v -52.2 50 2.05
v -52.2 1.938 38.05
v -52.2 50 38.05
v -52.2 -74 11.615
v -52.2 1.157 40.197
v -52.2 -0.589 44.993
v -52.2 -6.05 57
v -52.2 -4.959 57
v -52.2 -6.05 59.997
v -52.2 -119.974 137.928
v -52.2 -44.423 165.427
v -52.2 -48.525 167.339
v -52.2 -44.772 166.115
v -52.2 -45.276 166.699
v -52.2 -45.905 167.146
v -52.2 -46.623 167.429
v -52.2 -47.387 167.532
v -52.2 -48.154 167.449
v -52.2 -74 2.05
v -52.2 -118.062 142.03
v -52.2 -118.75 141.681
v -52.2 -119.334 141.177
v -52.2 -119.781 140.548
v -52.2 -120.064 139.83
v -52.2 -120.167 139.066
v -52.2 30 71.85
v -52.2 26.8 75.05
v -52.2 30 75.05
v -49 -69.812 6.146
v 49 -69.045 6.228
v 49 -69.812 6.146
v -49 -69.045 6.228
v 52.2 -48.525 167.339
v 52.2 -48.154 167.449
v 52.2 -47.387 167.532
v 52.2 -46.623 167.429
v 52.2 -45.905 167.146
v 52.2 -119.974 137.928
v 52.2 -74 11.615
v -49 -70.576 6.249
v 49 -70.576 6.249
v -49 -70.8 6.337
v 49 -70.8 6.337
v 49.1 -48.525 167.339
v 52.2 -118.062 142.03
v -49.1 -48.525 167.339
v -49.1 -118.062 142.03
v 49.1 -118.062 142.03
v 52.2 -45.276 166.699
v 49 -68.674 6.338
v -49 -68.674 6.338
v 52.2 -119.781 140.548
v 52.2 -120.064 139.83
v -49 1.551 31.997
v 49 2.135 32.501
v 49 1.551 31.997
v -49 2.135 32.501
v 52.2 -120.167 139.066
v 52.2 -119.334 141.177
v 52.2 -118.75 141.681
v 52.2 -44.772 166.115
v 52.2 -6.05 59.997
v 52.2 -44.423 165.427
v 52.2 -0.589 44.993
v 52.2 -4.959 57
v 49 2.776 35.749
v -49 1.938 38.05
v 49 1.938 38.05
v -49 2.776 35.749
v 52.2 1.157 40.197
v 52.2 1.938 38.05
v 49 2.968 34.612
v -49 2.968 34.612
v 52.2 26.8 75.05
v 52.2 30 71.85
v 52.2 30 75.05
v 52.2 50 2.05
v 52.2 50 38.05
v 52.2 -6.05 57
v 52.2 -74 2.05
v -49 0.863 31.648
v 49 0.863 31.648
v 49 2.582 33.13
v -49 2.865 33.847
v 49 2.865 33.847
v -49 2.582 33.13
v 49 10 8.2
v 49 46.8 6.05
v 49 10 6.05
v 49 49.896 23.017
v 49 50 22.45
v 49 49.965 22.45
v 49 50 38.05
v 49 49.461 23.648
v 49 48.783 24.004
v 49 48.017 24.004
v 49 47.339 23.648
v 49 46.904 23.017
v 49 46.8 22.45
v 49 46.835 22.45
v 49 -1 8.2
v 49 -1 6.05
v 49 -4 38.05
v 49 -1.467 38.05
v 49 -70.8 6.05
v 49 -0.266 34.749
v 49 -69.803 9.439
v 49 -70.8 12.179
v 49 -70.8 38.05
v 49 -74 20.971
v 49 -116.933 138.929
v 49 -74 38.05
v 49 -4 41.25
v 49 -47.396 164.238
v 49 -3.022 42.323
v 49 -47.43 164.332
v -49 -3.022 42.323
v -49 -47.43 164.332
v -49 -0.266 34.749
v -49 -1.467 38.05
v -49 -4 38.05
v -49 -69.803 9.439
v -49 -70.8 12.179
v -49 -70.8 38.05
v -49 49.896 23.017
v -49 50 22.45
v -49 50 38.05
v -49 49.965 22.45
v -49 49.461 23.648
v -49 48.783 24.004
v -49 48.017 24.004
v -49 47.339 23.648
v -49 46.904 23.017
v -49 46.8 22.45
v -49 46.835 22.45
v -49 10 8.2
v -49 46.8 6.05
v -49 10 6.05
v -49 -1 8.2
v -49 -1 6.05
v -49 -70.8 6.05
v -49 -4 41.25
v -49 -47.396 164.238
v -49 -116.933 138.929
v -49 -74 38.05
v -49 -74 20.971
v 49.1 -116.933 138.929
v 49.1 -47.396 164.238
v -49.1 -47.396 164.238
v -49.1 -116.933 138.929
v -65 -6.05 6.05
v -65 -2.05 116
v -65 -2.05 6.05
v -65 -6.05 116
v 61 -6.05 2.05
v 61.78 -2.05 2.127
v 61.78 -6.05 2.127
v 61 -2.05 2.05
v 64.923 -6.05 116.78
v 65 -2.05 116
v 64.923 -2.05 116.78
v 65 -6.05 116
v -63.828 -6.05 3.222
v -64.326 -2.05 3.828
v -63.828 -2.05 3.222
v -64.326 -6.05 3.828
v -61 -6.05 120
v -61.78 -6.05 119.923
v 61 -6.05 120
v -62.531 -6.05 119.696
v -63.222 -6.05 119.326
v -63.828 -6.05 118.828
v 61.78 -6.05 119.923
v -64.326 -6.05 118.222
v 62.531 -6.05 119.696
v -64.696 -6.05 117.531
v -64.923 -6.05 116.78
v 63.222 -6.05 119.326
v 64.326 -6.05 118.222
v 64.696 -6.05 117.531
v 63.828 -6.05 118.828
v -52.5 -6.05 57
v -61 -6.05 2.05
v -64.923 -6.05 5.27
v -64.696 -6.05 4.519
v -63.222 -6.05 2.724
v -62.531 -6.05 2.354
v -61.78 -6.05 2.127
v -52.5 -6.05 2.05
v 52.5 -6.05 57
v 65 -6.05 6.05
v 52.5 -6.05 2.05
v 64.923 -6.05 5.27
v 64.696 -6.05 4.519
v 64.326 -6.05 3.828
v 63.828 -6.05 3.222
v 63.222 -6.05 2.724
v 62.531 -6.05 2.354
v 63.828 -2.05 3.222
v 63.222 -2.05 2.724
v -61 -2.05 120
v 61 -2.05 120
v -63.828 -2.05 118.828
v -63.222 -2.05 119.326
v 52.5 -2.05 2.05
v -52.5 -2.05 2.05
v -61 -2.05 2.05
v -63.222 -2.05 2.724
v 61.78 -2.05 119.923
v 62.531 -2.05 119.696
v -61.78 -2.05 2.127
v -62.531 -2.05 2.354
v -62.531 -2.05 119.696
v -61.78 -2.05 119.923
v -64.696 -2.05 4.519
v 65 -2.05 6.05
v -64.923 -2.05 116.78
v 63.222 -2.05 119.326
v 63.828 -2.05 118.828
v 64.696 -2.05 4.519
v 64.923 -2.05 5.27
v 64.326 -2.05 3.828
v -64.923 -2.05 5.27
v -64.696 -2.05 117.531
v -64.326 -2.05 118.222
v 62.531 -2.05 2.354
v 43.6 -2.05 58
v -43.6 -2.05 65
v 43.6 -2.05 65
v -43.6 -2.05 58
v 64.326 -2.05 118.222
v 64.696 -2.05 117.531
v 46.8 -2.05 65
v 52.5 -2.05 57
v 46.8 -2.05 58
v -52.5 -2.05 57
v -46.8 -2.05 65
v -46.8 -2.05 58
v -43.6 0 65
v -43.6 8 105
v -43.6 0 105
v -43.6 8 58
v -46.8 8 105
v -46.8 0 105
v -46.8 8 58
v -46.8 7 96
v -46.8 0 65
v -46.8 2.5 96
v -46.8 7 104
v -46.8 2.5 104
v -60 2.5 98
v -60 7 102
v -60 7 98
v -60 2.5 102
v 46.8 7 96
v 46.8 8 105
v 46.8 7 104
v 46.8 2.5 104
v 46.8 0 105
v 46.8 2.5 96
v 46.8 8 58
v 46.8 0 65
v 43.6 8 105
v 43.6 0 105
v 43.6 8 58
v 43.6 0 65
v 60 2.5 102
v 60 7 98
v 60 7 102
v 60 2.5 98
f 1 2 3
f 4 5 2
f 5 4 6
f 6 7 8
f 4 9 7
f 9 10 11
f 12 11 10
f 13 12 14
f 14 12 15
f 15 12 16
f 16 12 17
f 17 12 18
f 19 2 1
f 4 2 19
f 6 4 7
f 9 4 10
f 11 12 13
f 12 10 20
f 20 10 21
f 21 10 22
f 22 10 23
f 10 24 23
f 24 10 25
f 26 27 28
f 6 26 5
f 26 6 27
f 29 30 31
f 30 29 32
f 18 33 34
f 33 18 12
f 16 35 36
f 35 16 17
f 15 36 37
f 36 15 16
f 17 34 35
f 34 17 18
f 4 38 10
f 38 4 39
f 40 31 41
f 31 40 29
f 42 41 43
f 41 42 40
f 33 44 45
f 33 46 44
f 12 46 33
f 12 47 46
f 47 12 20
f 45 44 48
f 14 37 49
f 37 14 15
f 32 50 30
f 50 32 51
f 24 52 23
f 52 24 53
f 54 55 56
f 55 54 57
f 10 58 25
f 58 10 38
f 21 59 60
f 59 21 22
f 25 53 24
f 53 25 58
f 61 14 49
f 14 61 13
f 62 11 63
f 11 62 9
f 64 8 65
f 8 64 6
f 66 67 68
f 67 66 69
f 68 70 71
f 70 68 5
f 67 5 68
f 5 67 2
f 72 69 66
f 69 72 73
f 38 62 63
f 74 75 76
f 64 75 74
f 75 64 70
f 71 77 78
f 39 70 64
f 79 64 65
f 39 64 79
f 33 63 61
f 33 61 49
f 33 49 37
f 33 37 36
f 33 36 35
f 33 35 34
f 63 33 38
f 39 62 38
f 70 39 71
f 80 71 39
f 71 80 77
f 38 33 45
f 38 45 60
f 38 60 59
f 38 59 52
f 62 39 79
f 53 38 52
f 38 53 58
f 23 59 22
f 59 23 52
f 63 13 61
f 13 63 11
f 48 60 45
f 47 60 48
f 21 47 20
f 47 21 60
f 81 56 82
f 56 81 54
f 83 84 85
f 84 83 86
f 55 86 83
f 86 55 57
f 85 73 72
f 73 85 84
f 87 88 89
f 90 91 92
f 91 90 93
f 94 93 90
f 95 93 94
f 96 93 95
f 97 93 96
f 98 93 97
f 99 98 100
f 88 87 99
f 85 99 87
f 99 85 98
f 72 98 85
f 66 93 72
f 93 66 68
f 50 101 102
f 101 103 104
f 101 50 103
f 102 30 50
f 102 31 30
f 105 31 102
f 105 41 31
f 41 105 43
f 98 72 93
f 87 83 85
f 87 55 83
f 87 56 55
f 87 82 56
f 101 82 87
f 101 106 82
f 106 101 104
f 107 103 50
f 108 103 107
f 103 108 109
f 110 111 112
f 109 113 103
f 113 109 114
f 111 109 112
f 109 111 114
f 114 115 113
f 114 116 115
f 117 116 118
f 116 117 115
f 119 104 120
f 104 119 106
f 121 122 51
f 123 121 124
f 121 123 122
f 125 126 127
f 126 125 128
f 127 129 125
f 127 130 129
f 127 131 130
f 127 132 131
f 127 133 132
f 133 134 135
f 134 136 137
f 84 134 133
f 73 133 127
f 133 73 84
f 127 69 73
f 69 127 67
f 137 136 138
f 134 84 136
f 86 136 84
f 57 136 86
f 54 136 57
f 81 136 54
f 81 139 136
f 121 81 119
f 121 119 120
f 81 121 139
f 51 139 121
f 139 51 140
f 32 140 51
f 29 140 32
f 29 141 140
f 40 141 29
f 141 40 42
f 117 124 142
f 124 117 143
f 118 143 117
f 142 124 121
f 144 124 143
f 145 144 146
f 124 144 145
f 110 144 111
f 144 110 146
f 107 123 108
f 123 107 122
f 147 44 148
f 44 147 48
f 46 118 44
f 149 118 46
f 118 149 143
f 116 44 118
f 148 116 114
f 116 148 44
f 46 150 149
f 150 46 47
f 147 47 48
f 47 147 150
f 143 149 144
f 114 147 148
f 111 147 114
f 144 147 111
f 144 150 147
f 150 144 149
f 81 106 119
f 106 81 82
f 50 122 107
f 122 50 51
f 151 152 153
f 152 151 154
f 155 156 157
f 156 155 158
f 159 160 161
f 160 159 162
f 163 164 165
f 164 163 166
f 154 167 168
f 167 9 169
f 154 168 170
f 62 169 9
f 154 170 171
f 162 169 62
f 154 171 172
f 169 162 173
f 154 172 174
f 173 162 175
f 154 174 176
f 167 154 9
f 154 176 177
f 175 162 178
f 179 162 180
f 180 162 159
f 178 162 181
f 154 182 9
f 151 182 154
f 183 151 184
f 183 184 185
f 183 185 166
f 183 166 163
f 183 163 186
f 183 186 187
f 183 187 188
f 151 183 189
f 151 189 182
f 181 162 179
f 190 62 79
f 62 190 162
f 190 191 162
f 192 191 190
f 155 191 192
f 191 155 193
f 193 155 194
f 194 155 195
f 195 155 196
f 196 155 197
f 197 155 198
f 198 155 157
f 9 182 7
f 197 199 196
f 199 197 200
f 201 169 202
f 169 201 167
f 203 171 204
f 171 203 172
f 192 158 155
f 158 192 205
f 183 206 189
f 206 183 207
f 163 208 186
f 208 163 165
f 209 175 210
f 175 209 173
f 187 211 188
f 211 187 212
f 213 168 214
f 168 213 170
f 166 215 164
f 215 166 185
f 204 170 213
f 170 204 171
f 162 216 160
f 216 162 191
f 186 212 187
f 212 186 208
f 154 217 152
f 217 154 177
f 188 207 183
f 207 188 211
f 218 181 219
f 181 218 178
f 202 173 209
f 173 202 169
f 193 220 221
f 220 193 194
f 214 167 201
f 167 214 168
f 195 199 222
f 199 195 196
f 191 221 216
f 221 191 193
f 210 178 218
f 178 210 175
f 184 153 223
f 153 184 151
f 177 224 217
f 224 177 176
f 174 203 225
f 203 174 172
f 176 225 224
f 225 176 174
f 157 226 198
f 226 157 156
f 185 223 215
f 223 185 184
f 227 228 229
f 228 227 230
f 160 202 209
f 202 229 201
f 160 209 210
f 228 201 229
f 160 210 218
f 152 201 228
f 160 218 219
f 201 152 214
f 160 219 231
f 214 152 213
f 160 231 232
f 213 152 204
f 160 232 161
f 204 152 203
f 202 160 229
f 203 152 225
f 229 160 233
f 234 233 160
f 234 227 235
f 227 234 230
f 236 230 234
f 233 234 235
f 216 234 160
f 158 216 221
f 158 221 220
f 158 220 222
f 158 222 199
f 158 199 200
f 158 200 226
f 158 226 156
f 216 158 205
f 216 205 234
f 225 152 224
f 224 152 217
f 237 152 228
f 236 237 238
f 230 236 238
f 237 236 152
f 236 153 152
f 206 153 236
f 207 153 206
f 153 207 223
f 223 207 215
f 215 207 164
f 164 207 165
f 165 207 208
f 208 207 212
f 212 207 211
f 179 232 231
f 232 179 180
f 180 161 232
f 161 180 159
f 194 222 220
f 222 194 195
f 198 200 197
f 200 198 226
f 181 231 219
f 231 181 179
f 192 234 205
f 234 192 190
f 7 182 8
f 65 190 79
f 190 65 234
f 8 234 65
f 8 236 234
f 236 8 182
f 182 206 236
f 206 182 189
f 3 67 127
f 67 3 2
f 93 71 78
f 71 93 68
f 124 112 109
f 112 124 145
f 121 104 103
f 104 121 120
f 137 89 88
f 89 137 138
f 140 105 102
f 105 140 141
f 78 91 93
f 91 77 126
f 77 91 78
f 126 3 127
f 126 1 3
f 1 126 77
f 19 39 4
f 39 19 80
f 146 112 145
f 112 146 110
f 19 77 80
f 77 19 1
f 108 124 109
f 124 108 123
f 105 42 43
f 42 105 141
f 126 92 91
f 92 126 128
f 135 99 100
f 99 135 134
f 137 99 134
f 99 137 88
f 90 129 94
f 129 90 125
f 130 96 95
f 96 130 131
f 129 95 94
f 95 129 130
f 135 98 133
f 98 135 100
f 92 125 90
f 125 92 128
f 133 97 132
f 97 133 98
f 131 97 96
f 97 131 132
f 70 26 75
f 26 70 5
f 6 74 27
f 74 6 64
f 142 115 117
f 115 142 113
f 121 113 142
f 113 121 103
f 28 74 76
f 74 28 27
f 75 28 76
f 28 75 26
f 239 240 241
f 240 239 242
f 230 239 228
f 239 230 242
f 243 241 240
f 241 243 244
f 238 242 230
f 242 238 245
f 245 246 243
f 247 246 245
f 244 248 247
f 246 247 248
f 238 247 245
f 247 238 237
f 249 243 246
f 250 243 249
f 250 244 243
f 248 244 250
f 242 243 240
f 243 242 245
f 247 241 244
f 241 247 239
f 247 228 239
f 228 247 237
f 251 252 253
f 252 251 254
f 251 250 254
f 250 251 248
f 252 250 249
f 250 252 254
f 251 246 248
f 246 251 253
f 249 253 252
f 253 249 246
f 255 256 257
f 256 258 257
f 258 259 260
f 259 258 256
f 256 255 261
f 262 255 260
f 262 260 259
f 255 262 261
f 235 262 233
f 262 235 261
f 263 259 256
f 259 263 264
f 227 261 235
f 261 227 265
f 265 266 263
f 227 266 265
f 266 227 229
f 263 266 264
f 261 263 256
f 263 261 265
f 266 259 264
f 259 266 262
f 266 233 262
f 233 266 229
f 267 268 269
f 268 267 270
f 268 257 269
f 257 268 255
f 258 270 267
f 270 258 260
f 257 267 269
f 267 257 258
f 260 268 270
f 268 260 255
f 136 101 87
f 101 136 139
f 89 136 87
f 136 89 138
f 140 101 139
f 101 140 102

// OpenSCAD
part = "candidate_b";

$fa = 5;
$fs = 0.8;

door_width = 110;
door_height = 110;
bar_spacing = 12;
bar_diameter = 3.5;
wall = 3.2;
door_tolerance = 3;
tray_base = bar_diameter/2 + 0.3;

inner_width = door_width - 12;
passage_depth = 74;
passage_length = 138;
passage_angle = 70;
plate_width = door_width + 20;
plate_bottom = tray_base;
plate_top = door_height + 10;
plate_thickness = max(wall,4);
tray_back = -74;
tray_front = 50;
tray_floor = 4;
tray_wall_height = 32;
tray_lip_height = 18;
hood_front = 30;
hood_height = 53;
snap_reach = door_tolerance + 2;
snap_beam = wall;

axis_y = -cos(passage_angle);
axis_z = sin(passage_angle);
normal_y = sin(passage_angle);
normal_z = cos(passage_angle);
lower_y = -35;
lower_z = 22;

function p(d,l) = [lower_y + normal_y*d + axis_y*l, lower_z + normal_z*d + axis_z*l];

passage = [p(-passage_depth/2,0),p(passage_depth/2,0),p(passage_depth/2,passage_length),p(-passage_depth/2,passage_length)];

function side_x(s) = s > 0 ? inner_width/2 : -inner_width/2-wall;

module yz_extrude(width) {
    translate([-width/2,0,0]) rotate([90,0,90]) linear_extrude(width) children();
}

module rounded_xz(width,height,r) {
    offset(r=r) square([width-2*r,height-2*r],center=true);
}

module magazine_shell() {
    difference() {
        yz_extrude(inner_width+2*wall) offset(r=wall) polygon(passage);
        yz_extrude(inner_width) polygon(passage);
        yz_extrude(inner_width+0.2) polygon([
            p(-passage_depth/2,passage_length-0.1),
            p(passage_depth/2,passage_length-0.1),
            p(passage_depth/2,passage_length+20),
            p(-passage_depth/2,passage_length+20)
        ]);
        yz_extrude(inner_width+0.2) polygon([
            p(-passage_depth/2,-20),
            p(passage_depth/2,-20),
            p(passage_depth/2,0.1),
            p(-passage_depth/2,0.1)
        ]);
    }
}

module faceplate() {
    difference() {
        translate([0,-bar_diameter/2-0.3-plate_thickness/2,(plate_bottom+plate_top)/2])
            rotate([90,0,0]) linear_extrude(plate_thickness,center=true)
                rounded_xz(plate_width,plate_top-plate_bottom,4);
        translate([0,-bar_diameter/2-0.3-plate_thickness/2,28]) cube([inner_width+7,plate_thickness+2,58],center=true);
    }
}

module tray() {
    translate([-inner_width/2-wall,tray_back,0]) cube([inner_width+2*wall,tray_front-tray_back,tray_floor]);
    for (s=[-1,1]) translate([side_x(s),tray_back,tray_floor])
        cube([wall,tray_front-tray_back,tray_wall_height]);
    translate([-inner_width/2-wall,tray_back,tray_floor]) cube([inner_width+2*wall,wall,tray_wall_height]);
    translate([-inner_width/2-wall,tray_front-wall,tray_floor])
        cube([inner_width+2*wall,wall,tray_lip_height-wall/2]);
    translate([-inner_width/2-wall,tray_front-wall/2,tray_floor+tray_lip_height-wall/2])
        rotate([0,90,0]) cylinder(d=wall,h=inner_width+2*wall);
    for (s=[-1,1]) translate([s*(inner_width/2+wall/2),tray_front-12,tray_floor+tray_lip_height])
        rotate([90,0,0]) cylinder(d=wall,h=tray_front-tray_back-12);
}

module hood() {
    hood_low = tray_floor + tray_wall_height;
    hood_high = hood_low + hood_front + 7;
    hull() {
        translate([-inner_width/2-wall,-4,hood_low]) cube([inner_width+2*wall,wall,wall]);
        translate([-inner_width/2-wall,hood_front-wall,hood_high-wall]) cube([inner_width+2*wall,wall,wall]);
    }
    for (s=[-1,1]) hull() {
        translate([side_x(s),-4,hood_low]) cube([wall,wall,wall]);
        translate([side_x(s),hood_front-wall,hood_high-wall]) cube([wall,wall,wall]);
    }
    translate([-inner_width/2-wall,hood_front-wall/2,hood_high-wall/2]) rotate([0,90,0]) cylinder(d=wall,h=inner_width+2*wall);
}

module snap_arm(side) {
    x0 = side*(door_width/2-snap_reach-wall);
    beam_x = side > 0 ? x0-snap_beam : x0;
    translate([beam_x,0,58]) cube([snap_beam,8,47]);
    translate([side > 0 ? x0-snap_beam : x0,-3,58]) cube([snap_beam,11,7]);
    hull() {
        translate([beam_x,2.5,96]) cube([snap_beam,4.5,8]);
        translate([side > 0 ? door_width/2 : -door_width/2-snap_reach,2.5,98]) cube([snap_reach,4.5,4]);
    }
}

module snap_flange() {
    for (s=[-1,1]) snap_arm(s);
    translate([-inner_width/2,-1,2.2]) cube([inner_width,11,6]);
}

module reinforcements() {
    for (s=[-1,1]) hull() {
        translate([side_x(s),-66,0]) cube([wall,20,wall]);
        translate([side_x(s),-66,0]) cube([wall,wall,23]);
    }
}

module candidate_b() {
    union() {
        magazine_shell();
        faceplate();
        translate([0,0,tray_base]) tray();
        translate([0,0,tray_base]) hood();
        snap_flange();
        translate([0,0,tray_base]) reinforcements();
    }
}

module capacity() {
    intersection() {
        yz_extrude(inner_width) polygon(passage);
        translate([-inner_width/2,-135,-20]) cube([inner_width,140,184.8]);
    }
}

module outlet_probe() {
    yz_extrude(inner_width) polygon([
        p(-passage_depth/2,0),
        p(passage_depth/2,0),
        p(passage_depth/2,0.5),
        p(-passage_depth/2,0.5)
    ]);
}

module inlet_probe() {
    yz_extrude(inner_width) polygon([
        p(-passage_depth/2,passage_length-0.5),
        p(passage_depth/2,passage_length-0.5),
        p(passage_depth/2,passage_length),
        p(-passage_depth/2,passage_length)
    ]);
}

module outlet_clear_probe() {
    yz_extrude(inner_width-2) polygon([
        p(-passage_depth/2+1,0.1),
        p(passage_depth/2-1,0.1),
        p(passage_depth/2-1,0.4),
        p(-passage_depth/2+1,0.4)
    ]);
}

module inlet_clear_probe() {
    yz_extrude(inner_width-2) polygon([
        p(-passage_depth/2+1,passage_length-0.4),
        p(passage_depth/2-1,passage_length-0.4),
        p(passage_depth/2-1,passage_length-0.1),
        p(-passage_depth/2+1,passage_length-0.1)
    ]);
}

module cage() {
    for (x=[-120:bar_spacing:120]) difference() {
        translate([x,0,-20]) cylinder(d=bar_diameter,h=160);
        translate([-door_width/2,-10,0]) cube([door_width,20,door_height]);
    }
    for (z=[0,door_height]) translate([-120,0,z]) rotate([0,90,0]) cylinder(d=bar_diameter,h=240);
}

module section() {
    intersection() {
        candidate_b();
        translate([-0.8,-145,-20]) cube([1.6,230,220]);
    }
}

if (part == "capacity") capacity();
else if (part == "outlet_probe") outlet_probe();
else if (part == "inlet_probe") inlet_probe();
else if (part == "outlet_blockage") intersection() { candidate_b(); outlet_clear_probe(); }
else if (part == "inlet_blockage") intersection() { candidate_b(); inlet_clear_probe(); }
else if (part == "cage") cage();
else if (part == "static_interference") intersection() { candidate_b(); cage(); }
else if (part == "pull_interference") intersection() { translate([0,-3,0]) candidate_b(); cage(); }
else if (part == "door_section") intersection() { candidate_b(); translate([-100,-1.7,0.1]) cube([200,3.4,door_height-0.2]); }
else if (part == "section") section();
else candidate_b();
